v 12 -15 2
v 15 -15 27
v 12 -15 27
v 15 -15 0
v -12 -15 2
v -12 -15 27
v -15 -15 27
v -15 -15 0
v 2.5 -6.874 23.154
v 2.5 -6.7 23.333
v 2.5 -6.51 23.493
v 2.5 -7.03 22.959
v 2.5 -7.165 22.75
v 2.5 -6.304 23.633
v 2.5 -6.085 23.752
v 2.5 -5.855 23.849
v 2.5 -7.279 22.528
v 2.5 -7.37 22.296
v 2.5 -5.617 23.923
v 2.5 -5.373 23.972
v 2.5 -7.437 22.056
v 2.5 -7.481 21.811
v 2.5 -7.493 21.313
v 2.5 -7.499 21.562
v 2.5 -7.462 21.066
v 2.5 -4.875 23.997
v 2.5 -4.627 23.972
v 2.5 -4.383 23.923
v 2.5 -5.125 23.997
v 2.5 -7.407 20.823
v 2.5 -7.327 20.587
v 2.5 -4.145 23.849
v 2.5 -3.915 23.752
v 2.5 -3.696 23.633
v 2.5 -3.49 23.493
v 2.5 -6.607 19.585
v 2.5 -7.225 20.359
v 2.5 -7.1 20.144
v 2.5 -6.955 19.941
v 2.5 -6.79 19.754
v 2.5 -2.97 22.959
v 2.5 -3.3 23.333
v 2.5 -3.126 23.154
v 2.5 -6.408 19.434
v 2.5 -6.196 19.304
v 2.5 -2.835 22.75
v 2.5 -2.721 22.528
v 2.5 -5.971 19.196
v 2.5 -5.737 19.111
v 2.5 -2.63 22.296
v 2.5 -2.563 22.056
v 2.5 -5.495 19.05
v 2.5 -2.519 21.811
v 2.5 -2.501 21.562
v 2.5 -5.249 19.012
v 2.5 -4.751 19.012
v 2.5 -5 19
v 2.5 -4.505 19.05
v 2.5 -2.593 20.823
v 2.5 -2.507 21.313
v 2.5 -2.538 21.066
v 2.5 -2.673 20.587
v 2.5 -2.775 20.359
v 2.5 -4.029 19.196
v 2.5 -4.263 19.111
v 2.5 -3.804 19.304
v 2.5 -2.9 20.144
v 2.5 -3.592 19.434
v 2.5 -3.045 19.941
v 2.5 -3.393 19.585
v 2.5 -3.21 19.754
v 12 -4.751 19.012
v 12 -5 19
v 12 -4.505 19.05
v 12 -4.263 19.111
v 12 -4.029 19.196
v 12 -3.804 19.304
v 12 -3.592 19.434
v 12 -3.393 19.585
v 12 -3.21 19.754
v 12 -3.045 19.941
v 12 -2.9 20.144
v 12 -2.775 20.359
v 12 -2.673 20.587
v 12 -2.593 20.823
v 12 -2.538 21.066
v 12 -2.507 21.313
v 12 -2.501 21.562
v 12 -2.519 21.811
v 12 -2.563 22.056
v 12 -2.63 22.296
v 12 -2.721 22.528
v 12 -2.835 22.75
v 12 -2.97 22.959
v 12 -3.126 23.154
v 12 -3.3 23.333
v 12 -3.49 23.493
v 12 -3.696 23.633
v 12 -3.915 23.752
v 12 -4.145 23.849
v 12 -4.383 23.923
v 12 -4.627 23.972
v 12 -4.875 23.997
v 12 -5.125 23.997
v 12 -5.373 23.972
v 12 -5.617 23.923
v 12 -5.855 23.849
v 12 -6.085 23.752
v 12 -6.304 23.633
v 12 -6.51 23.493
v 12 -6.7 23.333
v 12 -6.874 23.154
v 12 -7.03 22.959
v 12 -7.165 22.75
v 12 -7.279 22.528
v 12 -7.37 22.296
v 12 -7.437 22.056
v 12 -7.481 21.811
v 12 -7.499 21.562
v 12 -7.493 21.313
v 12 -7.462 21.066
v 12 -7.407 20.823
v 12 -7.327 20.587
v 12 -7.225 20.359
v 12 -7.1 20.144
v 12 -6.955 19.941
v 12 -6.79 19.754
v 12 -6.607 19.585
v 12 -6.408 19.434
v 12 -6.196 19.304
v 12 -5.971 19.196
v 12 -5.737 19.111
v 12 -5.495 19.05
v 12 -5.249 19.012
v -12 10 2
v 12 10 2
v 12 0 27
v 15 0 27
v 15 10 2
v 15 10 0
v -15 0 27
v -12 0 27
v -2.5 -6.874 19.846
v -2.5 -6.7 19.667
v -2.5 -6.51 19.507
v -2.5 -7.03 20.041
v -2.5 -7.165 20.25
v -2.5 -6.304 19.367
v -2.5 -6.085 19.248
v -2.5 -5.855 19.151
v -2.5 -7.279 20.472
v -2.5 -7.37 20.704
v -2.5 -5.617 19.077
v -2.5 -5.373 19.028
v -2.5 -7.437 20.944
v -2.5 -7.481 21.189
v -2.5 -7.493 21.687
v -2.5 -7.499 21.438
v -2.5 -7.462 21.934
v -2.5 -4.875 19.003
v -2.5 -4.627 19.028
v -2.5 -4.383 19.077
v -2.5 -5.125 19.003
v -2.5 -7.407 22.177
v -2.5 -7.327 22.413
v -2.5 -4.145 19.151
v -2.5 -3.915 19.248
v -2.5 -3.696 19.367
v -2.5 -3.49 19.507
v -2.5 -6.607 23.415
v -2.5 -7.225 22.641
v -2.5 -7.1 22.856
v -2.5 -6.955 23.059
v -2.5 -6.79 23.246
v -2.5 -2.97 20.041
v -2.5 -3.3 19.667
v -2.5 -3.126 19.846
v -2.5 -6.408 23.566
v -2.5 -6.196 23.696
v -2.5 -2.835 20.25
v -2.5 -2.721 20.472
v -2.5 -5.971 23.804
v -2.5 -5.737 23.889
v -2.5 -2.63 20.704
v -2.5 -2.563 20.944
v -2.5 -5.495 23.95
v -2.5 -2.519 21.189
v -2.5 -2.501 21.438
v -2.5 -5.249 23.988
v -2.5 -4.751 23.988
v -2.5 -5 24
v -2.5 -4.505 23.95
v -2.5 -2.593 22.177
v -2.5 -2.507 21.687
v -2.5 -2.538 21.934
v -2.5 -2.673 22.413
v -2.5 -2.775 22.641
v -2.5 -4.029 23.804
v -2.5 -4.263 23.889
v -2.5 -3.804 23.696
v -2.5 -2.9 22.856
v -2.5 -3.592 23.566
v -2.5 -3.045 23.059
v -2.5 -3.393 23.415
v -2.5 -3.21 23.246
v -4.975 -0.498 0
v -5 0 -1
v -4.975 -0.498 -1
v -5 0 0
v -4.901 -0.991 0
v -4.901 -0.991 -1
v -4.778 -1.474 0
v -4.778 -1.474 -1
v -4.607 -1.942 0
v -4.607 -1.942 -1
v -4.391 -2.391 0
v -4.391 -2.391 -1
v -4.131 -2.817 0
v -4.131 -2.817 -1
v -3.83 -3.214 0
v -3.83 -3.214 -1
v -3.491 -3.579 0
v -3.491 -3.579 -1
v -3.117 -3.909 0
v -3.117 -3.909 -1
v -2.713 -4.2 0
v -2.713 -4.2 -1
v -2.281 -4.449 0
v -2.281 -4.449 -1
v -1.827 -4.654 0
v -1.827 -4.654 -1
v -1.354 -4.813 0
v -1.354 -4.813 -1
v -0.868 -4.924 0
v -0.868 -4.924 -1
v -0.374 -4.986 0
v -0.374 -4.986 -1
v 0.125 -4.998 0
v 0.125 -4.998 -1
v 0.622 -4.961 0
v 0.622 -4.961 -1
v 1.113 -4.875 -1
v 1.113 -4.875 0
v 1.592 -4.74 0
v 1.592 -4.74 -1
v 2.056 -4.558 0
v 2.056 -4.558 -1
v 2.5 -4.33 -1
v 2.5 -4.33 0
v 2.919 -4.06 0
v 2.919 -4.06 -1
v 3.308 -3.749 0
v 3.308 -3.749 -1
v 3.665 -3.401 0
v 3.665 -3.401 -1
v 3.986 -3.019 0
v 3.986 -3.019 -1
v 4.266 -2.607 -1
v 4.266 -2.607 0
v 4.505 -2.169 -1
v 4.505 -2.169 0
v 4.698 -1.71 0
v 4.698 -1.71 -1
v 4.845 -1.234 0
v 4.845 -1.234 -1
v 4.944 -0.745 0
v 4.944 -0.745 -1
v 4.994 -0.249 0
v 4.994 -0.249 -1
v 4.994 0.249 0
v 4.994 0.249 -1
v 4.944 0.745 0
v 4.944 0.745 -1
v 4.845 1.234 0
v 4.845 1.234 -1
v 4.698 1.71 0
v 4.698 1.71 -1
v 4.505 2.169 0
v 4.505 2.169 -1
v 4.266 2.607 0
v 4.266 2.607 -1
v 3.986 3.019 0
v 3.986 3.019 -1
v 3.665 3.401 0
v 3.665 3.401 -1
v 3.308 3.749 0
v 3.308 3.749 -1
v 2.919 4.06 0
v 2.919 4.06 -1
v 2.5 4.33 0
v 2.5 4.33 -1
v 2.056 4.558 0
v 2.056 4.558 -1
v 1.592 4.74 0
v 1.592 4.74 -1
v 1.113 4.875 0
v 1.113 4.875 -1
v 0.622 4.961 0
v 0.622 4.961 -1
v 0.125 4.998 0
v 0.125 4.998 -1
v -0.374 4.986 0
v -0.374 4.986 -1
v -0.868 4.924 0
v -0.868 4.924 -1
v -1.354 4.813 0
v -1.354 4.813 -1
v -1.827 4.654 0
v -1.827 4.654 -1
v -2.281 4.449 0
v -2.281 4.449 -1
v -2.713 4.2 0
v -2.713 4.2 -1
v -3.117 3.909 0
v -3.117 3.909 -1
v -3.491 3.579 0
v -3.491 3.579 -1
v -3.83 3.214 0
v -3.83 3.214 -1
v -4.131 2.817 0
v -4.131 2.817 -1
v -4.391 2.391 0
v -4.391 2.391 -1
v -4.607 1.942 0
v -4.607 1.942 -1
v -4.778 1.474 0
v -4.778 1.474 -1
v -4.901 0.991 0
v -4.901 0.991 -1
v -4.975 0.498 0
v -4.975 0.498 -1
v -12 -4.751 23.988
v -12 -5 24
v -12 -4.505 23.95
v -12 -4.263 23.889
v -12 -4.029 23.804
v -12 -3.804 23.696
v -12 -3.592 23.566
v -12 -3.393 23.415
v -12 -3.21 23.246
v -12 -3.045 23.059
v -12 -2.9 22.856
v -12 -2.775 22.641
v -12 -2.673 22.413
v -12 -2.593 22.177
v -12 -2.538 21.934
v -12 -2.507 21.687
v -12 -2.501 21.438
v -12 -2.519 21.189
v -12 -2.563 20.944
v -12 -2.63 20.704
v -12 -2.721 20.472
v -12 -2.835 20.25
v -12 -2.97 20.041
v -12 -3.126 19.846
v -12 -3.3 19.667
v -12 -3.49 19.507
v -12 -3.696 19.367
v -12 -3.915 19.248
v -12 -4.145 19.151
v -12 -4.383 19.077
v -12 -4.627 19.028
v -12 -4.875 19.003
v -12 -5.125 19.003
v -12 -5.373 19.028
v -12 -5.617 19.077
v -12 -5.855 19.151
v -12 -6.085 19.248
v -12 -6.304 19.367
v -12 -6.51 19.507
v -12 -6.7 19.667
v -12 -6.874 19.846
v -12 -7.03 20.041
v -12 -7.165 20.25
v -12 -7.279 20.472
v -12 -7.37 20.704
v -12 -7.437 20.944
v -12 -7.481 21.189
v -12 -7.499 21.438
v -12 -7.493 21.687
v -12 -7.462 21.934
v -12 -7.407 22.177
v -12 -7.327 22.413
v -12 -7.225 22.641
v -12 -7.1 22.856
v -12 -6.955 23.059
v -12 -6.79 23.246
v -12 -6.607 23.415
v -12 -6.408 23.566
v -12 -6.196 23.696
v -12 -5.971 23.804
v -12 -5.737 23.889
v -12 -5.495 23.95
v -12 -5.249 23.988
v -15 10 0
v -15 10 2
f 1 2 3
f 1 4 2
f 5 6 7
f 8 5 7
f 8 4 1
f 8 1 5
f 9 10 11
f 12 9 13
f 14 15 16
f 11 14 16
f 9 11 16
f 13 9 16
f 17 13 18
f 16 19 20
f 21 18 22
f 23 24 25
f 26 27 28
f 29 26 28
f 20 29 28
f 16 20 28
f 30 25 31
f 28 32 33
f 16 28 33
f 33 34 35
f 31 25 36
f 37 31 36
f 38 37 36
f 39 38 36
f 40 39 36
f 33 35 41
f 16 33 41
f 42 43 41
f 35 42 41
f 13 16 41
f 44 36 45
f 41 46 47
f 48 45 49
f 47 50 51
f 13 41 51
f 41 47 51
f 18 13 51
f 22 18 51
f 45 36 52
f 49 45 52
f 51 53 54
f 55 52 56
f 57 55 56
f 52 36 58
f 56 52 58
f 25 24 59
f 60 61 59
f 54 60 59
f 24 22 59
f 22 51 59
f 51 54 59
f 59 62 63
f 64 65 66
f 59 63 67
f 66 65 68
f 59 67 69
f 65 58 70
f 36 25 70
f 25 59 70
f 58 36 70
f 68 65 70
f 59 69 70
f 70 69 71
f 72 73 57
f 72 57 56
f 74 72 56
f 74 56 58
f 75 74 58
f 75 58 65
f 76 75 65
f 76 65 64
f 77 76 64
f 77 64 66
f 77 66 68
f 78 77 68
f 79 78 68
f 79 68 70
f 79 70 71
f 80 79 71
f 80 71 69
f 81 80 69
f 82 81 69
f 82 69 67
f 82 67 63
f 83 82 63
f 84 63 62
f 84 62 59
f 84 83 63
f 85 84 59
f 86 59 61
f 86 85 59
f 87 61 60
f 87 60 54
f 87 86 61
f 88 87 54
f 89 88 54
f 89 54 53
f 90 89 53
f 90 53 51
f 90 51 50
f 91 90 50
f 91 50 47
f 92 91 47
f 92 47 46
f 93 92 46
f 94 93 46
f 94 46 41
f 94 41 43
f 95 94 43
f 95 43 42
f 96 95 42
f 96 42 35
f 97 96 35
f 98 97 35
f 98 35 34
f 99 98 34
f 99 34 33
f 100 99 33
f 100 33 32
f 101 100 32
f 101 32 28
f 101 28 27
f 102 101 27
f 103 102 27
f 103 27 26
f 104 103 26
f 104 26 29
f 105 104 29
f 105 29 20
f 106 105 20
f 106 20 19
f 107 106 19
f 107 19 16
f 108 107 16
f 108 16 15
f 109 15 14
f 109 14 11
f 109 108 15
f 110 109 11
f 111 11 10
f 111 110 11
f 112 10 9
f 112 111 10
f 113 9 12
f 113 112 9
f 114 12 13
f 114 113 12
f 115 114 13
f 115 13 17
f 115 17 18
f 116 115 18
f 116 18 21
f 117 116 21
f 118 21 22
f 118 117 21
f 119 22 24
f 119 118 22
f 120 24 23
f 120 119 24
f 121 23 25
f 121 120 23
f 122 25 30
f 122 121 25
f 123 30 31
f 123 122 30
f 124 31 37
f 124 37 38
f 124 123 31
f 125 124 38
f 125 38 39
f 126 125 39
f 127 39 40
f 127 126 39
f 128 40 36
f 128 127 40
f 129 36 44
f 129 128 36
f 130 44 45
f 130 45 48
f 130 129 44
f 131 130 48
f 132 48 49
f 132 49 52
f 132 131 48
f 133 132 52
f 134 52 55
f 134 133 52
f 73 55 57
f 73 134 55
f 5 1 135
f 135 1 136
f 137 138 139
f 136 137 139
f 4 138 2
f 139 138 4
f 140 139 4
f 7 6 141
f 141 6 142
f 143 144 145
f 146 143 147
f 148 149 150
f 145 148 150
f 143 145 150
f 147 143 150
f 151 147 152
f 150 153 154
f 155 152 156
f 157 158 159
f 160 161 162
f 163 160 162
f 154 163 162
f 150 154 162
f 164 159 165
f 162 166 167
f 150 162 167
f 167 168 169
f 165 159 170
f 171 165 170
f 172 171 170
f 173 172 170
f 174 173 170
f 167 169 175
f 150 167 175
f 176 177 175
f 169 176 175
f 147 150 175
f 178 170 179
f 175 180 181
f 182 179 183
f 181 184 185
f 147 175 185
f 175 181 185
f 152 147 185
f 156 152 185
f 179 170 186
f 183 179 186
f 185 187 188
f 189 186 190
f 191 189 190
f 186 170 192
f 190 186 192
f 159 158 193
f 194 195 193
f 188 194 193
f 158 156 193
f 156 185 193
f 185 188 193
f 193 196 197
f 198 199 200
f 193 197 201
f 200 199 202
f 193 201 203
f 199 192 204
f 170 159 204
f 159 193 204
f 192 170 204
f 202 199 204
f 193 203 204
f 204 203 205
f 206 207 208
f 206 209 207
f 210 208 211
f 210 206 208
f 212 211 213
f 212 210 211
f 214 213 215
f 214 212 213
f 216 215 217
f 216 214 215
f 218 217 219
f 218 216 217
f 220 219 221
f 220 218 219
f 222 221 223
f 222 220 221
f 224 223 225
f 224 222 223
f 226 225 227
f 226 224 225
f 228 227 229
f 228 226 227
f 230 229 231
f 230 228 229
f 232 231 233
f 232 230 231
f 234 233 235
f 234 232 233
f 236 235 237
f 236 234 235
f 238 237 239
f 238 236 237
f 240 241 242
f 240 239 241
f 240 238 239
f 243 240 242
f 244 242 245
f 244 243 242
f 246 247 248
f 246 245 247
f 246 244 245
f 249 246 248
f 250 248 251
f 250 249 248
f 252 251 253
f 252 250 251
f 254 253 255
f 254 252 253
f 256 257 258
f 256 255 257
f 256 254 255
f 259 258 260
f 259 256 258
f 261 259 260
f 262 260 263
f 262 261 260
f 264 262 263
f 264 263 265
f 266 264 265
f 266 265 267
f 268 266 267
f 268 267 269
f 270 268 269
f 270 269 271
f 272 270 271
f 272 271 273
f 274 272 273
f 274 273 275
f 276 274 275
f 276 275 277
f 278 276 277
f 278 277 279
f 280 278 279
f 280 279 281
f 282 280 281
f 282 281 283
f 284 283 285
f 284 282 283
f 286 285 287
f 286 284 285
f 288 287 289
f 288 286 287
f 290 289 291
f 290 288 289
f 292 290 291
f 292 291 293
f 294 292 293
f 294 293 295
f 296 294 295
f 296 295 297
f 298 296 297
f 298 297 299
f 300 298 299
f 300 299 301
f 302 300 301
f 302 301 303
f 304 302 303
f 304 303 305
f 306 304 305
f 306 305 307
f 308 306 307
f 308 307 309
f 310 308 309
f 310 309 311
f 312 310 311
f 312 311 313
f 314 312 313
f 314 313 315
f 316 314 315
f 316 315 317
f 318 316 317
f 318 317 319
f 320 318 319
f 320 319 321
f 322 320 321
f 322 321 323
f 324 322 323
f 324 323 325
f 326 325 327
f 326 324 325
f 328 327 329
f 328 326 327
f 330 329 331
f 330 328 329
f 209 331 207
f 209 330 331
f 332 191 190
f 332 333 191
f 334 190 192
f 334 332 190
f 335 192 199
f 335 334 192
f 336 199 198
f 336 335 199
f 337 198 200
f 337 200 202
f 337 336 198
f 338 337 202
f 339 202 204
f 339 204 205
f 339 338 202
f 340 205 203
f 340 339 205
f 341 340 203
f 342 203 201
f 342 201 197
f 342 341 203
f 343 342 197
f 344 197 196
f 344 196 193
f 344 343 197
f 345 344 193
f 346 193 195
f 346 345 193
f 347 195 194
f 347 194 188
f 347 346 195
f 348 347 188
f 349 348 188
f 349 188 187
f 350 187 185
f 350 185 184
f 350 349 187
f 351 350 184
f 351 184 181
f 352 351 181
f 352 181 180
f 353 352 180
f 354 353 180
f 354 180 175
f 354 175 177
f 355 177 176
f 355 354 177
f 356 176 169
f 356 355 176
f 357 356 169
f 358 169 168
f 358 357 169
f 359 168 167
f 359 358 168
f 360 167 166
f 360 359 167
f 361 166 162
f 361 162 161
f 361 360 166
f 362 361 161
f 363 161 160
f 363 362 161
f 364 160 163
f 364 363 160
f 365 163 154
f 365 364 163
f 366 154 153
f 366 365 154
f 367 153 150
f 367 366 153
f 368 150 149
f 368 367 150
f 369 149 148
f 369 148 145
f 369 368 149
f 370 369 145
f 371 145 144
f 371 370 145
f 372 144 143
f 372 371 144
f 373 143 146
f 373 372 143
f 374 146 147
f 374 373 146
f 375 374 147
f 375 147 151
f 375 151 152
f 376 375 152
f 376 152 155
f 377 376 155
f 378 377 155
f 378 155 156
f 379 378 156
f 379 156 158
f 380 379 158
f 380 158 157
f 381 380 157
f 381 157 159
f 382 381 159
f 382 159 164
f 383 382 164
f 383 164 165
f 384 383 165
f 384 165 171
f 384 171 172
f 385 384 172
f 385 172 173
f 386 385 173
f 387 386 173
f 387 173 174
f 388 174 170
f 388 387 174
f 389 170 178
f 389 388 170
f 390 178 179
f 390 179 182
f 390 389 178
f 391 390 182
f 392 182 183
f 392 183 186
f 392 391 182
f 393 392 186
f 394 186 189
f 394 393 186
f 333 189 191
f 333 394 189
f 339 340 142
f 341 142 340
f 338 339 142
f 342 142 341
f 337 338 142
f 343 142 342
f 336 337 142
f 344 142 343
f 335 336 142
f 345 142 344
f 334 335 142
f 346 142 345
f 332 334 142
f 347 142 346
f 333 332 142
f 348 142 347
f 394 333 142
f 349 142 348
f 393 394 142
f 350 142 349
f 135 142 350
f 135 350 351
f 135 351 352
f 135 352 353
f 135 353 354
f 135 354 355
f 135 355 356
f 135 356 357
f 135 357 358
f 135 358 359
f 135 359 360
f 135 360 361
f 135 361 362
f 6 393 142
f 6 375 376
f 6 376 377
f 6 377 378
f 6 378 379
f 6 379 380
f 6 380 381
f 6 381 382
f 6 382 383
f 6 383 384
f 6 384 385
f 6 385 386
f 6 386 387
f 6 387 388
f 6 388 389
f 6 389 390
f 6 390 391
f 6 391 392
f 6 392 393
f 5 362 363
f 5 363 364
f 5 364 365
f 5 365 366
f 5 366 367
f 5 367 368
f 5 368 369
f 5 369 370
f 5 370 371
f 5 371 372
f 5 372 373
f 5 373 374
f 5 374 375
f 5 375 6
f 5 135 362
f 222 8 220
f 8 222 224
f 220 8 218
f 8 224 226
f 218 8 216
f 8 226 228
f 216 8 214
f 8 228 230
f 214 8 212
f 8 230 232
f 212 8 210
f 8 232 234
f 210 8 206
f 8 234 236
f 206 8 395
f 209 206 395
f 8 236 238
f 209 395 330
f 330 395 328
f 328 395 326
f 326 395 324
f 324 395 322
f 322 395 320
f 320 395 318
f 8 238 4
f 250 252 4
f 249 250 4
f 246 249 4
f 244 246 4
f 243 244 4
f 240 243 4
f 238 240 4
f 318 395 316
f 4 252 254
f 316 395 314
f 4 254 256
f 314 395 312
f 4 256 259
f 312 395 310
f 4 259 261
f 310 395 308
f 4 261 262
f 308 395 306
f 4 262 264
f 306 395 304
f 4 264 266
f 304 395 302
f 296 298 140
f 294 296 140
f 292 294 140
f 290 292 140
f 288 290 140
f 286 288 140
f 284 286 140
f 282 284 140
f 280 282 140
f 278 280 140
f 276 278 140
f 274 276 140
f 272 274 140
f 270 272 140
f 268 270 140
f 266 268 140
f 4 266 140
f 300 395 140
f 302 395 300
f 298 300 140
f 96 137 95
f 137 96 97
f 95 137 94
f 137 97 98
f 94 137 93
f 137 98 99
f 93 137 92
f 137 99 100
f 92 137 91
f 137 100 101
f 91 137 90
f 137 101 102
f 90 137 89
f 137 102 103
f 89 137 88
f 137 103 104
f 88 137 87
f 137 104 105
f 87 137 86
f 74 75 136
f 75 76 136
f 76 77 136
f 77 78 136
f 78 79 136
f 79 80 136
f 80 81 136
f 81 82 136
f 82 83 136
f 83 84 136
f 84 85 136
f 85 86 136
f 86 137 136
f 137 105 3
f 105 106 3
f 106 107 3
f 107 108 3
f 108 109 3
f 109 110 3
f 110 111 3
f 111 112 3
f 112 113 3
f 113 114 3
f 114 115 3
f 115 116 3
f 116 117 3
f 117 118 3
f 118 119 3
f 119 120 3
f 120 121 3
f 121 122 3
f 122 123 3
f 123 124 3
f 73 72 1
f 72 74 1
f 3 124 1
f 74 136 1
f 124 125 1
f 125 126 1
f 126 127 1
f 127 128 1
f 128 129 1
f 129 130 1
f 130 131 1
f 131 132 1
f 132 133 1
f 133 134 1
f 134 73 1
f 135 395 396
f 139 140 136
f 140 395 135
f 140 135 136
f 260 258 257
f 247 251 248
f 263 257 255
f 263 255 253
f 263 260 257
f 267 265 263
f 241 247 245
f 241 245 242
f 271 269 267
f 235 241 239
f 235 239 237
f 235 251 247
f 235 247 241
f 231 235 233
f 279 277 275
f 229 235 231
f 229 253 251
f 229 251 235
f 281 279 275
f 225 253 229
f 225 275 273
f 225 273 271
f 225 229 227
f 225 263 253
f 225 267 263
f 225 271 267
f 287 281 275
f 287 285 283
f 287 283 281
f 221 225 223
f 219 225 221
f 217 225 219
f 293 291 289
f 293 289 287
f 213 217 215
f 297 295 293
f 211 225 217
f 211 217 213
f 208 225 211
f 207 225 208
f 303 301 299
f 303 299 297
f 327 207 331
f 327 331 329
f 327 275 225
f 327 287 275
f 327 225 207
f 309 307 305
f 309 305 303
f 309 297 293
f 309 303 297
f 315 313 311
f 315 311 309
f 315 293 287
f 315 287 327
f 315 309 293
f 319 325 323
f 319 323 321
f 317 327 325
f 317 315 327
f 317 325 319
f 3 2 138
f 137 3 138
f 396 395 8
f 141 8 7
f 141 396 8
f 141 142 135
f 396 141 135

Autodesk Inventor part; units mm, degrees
ref_plane "YZ Plane" through (0, 0, 0) normal (1, 0, 0) x (0, 1, 0)
ref_plane "XZ Plane" through (0, 0, 0) normal (0, 1, 0) x (-1, 0, 0)
ref_plane "XY Plane" through (0, 0, 0) normal (0, 0, 1) x (1, 0, 0)
sketch "스케치1" plane through (0, 0, 0) normal (0, 0, 1) x (1, 0, 0)
  line L0 (15, -15) -> (-15, -15)
  line L1 (-15, -15) -> (-15, 15)
  line L2 (-15, 15) -> (15, 15)
  line L3 (15, 15) -> (15, -15)
  line L4 (15, -15) -> (-15, 15) construction
  line L5 (-15, -15) -> (15, 15) construction
  point P0 (0, 0)
  dimension "d0" = 30
  dimension "d1" = 30
extrude "돌출1" add sketch "스케치1" along normal blind 2
sketch "스케치2" plane through (0, 0, 2) normal (0, 0, 1) x (1, 0, 0)
  line L0 (-15, 15) -> (-15, -15) projected
  line L1 (-15, -15) -> (15, -15) projected
  line L2 (-15, 15) -> (-12, 15)
  line L3 (-12, 15) -> (-12, -15)
  line L4 (-12, -15) -> (-15, -15)
  line L5 (-15, -15) -> (-15, 15)
  line L6 (15, -15) -> (15, 15) projected
  line L7 (15, 15) -> (12, 15)
  line L8 (12, 15) -> (12, -15)
  line L9 (12, -15) -> (15, -15)
  line L10 (15, -15) -> (15, 15)
  point P0 (0, 0)
  dimension "d4" = 3
  dimension "d5" = 3
extrude "돌출2" add sketch "스케치2" along normal blind 30
sketch "스케치3" plane through (0, 0, 0) normal (0, 0, -1) x (-1, 0, 0)
  circle A0 centre (0, 0) radius 5
  dimension "d8" = 10
extrude "돌출3" add sketch "스케치3" along normal blind 1
sketch "스케치4" plane through (15, -15, 0) normal (1, 0, 0) x (0, 0, -1)
  line L0 (0, 0) -> (-39, 0)
  line L1 (-39, 0) -> (-26.5, 0)
  line L2 (-2, 0) -> (-32, 0) projected
  line L3 (-26.5, 0) -> (-26.5, 10)
  circle A0 centre (-26.5, 10) radius 2.5
  line L4 (0, 0) -> (-32, 0) projected
  line L5 (0, 0) -> (-34, 0)
  line L6 (-34, 0) -> (-21.5, 0)
  line L7 (-21.5, 0) -> (-21.5, 10)
  circle A1 centre (-21.5, 10) radius 2.5
  point P0 (0, 15)
  dimension "d11" = 39
  dimension "d12" = 12.5
  dimension "d13" = 5
  dimension "d14" = 10
  dimension "d32" = 34
  dimension "d33" = 12.5
extrude "돌출4" add sketch "스케치4" against normal blind 12.5 contours A1
sketch "스케치5" plane through (-15, -15, 0) normal (-1, 0, 0) x (0, 0, 1)
  circle A0 centre (26.5, 10) radius 2.5 projected
  circle A1 centre (21.5, 10) radius 2.5 projected
  circle A2 centre (21.5, 10) radius 2.5 projected
  point P0 (0, 15)
extrude "돌출5" add sketch "스케치5" against normal blind 12.5 contours A1
sketch "스케치6" plane through (15, -15, 0) normal (1, 0, 0) x (0, 0, -1)
  line L0 (0, 30) -> (-32, 30) projected
  line L1 (-2, 30) -> (-32, 30) projected
  line L2 (-2, 30) -> (-32, 30) projected
  line L3 (0, 30) -> (-32, 30) projected
  line L4 (-2, 0) -> (-2, 30) projected
  line L5 (-2, 30) -> (-2, 0) projected
  line L6 (0, 30) -> (-32, 30) projected
  line L7 (-2, 30) -> (-2, 0) projected
  line L8 (0, 30) -> (-2, 30)
  line L9 (-2, 30) -> (-7, 30)
  line L10 (-2, 30) -> (-32, 30) projected
  line L11 (-32, 0) -> (-32, 30) projected
  line L12 (-7, 30) -> (-32, 30)
  line L13 (-32, 30) -> (-32, 20)
  line L14 (-32, 20) -> (-7, 30)
  circle A0 centre (-26.5, 10) radius 2.5 projected
  line L15 (0, 0) -> (-32, 0) projected
  line L16 (-32, 0) -> (-27, 0)
  line L17 (-27, 0) -> (-27, 22)
  point P0 (0, 15)
  point P1 (-7, 30)
  dimension "d19" = 2
  dimension "d20" = 5
  dimension "d21" = 10
  dimension "d22" = 5
extrude "돌출6" cut sketch "스케치6" against normal through all contours L14 L11 L0 | L17 A0 L15 L11 L14 | L17 A0 picked at (-27.6602, 9.8965)
sketch "스케치7" plane through (15, -15, 0) normal (1, 0, 0) x (0, 0, -1)
  line L0 (-2, 0) -> (-2, 30) projected
  line L1 (-2, 30) -> (-2, 25)
  line L2 (-2, 30) -> (-2, 0) projected
  line L3 (-2, 25) -> (-27, 25)
  line L4 (-27, 22) -> (-27, 0) projected
  arc A0 (-27, 7.5505) -> (-27, 12.4495) centre (-26.5, 10) ccw projected
  line L5 (-27, 25) -> (-27, 15)
  line L6 (-27, 15) -> (-2, 25)
  line L7 (-27, 22) -> (-27, 0) projected
  line L8 (0, 0) -> (-27, 0) projected
  line L9 (0, 0) -> (0, 30) projected
  line L10 (0, 30) -> (-7, 30) projected
  line L11 (-7, 30) -> (-27, 22) projected
  point P0 (0, 15)
  point P1 (-2, 25)
  dimension "d25" = 5
  dimension "d26" = 10
extrude "돌출7" cut sketch "스케치7" against normal through all contours L3 L11 L10 L0 | L6 L4 L11 L3
sketch "스케치8" plane through (15, -15, 0) normal (1, 0, 0) x (0, 0, -1)
  line L0 (0, 0) -> (0, 30) projected
  line L1 (0, 30) -> (0, 25)
  line L2 (0, 25) -> (-2, 25)
  line L3 (0, 30) -> (-2, 30) projected
  line L4 (-2, 25) -> (-2, 30)
  line L5 (0, 30) -> (-2, 30)
  point P0 (0, 15)
  dimension "d29" = 5
extrude "돌출8" cut sketch "스케치8" against normal through all
properties part number "castor_link2" material "알루미늄 6061"
